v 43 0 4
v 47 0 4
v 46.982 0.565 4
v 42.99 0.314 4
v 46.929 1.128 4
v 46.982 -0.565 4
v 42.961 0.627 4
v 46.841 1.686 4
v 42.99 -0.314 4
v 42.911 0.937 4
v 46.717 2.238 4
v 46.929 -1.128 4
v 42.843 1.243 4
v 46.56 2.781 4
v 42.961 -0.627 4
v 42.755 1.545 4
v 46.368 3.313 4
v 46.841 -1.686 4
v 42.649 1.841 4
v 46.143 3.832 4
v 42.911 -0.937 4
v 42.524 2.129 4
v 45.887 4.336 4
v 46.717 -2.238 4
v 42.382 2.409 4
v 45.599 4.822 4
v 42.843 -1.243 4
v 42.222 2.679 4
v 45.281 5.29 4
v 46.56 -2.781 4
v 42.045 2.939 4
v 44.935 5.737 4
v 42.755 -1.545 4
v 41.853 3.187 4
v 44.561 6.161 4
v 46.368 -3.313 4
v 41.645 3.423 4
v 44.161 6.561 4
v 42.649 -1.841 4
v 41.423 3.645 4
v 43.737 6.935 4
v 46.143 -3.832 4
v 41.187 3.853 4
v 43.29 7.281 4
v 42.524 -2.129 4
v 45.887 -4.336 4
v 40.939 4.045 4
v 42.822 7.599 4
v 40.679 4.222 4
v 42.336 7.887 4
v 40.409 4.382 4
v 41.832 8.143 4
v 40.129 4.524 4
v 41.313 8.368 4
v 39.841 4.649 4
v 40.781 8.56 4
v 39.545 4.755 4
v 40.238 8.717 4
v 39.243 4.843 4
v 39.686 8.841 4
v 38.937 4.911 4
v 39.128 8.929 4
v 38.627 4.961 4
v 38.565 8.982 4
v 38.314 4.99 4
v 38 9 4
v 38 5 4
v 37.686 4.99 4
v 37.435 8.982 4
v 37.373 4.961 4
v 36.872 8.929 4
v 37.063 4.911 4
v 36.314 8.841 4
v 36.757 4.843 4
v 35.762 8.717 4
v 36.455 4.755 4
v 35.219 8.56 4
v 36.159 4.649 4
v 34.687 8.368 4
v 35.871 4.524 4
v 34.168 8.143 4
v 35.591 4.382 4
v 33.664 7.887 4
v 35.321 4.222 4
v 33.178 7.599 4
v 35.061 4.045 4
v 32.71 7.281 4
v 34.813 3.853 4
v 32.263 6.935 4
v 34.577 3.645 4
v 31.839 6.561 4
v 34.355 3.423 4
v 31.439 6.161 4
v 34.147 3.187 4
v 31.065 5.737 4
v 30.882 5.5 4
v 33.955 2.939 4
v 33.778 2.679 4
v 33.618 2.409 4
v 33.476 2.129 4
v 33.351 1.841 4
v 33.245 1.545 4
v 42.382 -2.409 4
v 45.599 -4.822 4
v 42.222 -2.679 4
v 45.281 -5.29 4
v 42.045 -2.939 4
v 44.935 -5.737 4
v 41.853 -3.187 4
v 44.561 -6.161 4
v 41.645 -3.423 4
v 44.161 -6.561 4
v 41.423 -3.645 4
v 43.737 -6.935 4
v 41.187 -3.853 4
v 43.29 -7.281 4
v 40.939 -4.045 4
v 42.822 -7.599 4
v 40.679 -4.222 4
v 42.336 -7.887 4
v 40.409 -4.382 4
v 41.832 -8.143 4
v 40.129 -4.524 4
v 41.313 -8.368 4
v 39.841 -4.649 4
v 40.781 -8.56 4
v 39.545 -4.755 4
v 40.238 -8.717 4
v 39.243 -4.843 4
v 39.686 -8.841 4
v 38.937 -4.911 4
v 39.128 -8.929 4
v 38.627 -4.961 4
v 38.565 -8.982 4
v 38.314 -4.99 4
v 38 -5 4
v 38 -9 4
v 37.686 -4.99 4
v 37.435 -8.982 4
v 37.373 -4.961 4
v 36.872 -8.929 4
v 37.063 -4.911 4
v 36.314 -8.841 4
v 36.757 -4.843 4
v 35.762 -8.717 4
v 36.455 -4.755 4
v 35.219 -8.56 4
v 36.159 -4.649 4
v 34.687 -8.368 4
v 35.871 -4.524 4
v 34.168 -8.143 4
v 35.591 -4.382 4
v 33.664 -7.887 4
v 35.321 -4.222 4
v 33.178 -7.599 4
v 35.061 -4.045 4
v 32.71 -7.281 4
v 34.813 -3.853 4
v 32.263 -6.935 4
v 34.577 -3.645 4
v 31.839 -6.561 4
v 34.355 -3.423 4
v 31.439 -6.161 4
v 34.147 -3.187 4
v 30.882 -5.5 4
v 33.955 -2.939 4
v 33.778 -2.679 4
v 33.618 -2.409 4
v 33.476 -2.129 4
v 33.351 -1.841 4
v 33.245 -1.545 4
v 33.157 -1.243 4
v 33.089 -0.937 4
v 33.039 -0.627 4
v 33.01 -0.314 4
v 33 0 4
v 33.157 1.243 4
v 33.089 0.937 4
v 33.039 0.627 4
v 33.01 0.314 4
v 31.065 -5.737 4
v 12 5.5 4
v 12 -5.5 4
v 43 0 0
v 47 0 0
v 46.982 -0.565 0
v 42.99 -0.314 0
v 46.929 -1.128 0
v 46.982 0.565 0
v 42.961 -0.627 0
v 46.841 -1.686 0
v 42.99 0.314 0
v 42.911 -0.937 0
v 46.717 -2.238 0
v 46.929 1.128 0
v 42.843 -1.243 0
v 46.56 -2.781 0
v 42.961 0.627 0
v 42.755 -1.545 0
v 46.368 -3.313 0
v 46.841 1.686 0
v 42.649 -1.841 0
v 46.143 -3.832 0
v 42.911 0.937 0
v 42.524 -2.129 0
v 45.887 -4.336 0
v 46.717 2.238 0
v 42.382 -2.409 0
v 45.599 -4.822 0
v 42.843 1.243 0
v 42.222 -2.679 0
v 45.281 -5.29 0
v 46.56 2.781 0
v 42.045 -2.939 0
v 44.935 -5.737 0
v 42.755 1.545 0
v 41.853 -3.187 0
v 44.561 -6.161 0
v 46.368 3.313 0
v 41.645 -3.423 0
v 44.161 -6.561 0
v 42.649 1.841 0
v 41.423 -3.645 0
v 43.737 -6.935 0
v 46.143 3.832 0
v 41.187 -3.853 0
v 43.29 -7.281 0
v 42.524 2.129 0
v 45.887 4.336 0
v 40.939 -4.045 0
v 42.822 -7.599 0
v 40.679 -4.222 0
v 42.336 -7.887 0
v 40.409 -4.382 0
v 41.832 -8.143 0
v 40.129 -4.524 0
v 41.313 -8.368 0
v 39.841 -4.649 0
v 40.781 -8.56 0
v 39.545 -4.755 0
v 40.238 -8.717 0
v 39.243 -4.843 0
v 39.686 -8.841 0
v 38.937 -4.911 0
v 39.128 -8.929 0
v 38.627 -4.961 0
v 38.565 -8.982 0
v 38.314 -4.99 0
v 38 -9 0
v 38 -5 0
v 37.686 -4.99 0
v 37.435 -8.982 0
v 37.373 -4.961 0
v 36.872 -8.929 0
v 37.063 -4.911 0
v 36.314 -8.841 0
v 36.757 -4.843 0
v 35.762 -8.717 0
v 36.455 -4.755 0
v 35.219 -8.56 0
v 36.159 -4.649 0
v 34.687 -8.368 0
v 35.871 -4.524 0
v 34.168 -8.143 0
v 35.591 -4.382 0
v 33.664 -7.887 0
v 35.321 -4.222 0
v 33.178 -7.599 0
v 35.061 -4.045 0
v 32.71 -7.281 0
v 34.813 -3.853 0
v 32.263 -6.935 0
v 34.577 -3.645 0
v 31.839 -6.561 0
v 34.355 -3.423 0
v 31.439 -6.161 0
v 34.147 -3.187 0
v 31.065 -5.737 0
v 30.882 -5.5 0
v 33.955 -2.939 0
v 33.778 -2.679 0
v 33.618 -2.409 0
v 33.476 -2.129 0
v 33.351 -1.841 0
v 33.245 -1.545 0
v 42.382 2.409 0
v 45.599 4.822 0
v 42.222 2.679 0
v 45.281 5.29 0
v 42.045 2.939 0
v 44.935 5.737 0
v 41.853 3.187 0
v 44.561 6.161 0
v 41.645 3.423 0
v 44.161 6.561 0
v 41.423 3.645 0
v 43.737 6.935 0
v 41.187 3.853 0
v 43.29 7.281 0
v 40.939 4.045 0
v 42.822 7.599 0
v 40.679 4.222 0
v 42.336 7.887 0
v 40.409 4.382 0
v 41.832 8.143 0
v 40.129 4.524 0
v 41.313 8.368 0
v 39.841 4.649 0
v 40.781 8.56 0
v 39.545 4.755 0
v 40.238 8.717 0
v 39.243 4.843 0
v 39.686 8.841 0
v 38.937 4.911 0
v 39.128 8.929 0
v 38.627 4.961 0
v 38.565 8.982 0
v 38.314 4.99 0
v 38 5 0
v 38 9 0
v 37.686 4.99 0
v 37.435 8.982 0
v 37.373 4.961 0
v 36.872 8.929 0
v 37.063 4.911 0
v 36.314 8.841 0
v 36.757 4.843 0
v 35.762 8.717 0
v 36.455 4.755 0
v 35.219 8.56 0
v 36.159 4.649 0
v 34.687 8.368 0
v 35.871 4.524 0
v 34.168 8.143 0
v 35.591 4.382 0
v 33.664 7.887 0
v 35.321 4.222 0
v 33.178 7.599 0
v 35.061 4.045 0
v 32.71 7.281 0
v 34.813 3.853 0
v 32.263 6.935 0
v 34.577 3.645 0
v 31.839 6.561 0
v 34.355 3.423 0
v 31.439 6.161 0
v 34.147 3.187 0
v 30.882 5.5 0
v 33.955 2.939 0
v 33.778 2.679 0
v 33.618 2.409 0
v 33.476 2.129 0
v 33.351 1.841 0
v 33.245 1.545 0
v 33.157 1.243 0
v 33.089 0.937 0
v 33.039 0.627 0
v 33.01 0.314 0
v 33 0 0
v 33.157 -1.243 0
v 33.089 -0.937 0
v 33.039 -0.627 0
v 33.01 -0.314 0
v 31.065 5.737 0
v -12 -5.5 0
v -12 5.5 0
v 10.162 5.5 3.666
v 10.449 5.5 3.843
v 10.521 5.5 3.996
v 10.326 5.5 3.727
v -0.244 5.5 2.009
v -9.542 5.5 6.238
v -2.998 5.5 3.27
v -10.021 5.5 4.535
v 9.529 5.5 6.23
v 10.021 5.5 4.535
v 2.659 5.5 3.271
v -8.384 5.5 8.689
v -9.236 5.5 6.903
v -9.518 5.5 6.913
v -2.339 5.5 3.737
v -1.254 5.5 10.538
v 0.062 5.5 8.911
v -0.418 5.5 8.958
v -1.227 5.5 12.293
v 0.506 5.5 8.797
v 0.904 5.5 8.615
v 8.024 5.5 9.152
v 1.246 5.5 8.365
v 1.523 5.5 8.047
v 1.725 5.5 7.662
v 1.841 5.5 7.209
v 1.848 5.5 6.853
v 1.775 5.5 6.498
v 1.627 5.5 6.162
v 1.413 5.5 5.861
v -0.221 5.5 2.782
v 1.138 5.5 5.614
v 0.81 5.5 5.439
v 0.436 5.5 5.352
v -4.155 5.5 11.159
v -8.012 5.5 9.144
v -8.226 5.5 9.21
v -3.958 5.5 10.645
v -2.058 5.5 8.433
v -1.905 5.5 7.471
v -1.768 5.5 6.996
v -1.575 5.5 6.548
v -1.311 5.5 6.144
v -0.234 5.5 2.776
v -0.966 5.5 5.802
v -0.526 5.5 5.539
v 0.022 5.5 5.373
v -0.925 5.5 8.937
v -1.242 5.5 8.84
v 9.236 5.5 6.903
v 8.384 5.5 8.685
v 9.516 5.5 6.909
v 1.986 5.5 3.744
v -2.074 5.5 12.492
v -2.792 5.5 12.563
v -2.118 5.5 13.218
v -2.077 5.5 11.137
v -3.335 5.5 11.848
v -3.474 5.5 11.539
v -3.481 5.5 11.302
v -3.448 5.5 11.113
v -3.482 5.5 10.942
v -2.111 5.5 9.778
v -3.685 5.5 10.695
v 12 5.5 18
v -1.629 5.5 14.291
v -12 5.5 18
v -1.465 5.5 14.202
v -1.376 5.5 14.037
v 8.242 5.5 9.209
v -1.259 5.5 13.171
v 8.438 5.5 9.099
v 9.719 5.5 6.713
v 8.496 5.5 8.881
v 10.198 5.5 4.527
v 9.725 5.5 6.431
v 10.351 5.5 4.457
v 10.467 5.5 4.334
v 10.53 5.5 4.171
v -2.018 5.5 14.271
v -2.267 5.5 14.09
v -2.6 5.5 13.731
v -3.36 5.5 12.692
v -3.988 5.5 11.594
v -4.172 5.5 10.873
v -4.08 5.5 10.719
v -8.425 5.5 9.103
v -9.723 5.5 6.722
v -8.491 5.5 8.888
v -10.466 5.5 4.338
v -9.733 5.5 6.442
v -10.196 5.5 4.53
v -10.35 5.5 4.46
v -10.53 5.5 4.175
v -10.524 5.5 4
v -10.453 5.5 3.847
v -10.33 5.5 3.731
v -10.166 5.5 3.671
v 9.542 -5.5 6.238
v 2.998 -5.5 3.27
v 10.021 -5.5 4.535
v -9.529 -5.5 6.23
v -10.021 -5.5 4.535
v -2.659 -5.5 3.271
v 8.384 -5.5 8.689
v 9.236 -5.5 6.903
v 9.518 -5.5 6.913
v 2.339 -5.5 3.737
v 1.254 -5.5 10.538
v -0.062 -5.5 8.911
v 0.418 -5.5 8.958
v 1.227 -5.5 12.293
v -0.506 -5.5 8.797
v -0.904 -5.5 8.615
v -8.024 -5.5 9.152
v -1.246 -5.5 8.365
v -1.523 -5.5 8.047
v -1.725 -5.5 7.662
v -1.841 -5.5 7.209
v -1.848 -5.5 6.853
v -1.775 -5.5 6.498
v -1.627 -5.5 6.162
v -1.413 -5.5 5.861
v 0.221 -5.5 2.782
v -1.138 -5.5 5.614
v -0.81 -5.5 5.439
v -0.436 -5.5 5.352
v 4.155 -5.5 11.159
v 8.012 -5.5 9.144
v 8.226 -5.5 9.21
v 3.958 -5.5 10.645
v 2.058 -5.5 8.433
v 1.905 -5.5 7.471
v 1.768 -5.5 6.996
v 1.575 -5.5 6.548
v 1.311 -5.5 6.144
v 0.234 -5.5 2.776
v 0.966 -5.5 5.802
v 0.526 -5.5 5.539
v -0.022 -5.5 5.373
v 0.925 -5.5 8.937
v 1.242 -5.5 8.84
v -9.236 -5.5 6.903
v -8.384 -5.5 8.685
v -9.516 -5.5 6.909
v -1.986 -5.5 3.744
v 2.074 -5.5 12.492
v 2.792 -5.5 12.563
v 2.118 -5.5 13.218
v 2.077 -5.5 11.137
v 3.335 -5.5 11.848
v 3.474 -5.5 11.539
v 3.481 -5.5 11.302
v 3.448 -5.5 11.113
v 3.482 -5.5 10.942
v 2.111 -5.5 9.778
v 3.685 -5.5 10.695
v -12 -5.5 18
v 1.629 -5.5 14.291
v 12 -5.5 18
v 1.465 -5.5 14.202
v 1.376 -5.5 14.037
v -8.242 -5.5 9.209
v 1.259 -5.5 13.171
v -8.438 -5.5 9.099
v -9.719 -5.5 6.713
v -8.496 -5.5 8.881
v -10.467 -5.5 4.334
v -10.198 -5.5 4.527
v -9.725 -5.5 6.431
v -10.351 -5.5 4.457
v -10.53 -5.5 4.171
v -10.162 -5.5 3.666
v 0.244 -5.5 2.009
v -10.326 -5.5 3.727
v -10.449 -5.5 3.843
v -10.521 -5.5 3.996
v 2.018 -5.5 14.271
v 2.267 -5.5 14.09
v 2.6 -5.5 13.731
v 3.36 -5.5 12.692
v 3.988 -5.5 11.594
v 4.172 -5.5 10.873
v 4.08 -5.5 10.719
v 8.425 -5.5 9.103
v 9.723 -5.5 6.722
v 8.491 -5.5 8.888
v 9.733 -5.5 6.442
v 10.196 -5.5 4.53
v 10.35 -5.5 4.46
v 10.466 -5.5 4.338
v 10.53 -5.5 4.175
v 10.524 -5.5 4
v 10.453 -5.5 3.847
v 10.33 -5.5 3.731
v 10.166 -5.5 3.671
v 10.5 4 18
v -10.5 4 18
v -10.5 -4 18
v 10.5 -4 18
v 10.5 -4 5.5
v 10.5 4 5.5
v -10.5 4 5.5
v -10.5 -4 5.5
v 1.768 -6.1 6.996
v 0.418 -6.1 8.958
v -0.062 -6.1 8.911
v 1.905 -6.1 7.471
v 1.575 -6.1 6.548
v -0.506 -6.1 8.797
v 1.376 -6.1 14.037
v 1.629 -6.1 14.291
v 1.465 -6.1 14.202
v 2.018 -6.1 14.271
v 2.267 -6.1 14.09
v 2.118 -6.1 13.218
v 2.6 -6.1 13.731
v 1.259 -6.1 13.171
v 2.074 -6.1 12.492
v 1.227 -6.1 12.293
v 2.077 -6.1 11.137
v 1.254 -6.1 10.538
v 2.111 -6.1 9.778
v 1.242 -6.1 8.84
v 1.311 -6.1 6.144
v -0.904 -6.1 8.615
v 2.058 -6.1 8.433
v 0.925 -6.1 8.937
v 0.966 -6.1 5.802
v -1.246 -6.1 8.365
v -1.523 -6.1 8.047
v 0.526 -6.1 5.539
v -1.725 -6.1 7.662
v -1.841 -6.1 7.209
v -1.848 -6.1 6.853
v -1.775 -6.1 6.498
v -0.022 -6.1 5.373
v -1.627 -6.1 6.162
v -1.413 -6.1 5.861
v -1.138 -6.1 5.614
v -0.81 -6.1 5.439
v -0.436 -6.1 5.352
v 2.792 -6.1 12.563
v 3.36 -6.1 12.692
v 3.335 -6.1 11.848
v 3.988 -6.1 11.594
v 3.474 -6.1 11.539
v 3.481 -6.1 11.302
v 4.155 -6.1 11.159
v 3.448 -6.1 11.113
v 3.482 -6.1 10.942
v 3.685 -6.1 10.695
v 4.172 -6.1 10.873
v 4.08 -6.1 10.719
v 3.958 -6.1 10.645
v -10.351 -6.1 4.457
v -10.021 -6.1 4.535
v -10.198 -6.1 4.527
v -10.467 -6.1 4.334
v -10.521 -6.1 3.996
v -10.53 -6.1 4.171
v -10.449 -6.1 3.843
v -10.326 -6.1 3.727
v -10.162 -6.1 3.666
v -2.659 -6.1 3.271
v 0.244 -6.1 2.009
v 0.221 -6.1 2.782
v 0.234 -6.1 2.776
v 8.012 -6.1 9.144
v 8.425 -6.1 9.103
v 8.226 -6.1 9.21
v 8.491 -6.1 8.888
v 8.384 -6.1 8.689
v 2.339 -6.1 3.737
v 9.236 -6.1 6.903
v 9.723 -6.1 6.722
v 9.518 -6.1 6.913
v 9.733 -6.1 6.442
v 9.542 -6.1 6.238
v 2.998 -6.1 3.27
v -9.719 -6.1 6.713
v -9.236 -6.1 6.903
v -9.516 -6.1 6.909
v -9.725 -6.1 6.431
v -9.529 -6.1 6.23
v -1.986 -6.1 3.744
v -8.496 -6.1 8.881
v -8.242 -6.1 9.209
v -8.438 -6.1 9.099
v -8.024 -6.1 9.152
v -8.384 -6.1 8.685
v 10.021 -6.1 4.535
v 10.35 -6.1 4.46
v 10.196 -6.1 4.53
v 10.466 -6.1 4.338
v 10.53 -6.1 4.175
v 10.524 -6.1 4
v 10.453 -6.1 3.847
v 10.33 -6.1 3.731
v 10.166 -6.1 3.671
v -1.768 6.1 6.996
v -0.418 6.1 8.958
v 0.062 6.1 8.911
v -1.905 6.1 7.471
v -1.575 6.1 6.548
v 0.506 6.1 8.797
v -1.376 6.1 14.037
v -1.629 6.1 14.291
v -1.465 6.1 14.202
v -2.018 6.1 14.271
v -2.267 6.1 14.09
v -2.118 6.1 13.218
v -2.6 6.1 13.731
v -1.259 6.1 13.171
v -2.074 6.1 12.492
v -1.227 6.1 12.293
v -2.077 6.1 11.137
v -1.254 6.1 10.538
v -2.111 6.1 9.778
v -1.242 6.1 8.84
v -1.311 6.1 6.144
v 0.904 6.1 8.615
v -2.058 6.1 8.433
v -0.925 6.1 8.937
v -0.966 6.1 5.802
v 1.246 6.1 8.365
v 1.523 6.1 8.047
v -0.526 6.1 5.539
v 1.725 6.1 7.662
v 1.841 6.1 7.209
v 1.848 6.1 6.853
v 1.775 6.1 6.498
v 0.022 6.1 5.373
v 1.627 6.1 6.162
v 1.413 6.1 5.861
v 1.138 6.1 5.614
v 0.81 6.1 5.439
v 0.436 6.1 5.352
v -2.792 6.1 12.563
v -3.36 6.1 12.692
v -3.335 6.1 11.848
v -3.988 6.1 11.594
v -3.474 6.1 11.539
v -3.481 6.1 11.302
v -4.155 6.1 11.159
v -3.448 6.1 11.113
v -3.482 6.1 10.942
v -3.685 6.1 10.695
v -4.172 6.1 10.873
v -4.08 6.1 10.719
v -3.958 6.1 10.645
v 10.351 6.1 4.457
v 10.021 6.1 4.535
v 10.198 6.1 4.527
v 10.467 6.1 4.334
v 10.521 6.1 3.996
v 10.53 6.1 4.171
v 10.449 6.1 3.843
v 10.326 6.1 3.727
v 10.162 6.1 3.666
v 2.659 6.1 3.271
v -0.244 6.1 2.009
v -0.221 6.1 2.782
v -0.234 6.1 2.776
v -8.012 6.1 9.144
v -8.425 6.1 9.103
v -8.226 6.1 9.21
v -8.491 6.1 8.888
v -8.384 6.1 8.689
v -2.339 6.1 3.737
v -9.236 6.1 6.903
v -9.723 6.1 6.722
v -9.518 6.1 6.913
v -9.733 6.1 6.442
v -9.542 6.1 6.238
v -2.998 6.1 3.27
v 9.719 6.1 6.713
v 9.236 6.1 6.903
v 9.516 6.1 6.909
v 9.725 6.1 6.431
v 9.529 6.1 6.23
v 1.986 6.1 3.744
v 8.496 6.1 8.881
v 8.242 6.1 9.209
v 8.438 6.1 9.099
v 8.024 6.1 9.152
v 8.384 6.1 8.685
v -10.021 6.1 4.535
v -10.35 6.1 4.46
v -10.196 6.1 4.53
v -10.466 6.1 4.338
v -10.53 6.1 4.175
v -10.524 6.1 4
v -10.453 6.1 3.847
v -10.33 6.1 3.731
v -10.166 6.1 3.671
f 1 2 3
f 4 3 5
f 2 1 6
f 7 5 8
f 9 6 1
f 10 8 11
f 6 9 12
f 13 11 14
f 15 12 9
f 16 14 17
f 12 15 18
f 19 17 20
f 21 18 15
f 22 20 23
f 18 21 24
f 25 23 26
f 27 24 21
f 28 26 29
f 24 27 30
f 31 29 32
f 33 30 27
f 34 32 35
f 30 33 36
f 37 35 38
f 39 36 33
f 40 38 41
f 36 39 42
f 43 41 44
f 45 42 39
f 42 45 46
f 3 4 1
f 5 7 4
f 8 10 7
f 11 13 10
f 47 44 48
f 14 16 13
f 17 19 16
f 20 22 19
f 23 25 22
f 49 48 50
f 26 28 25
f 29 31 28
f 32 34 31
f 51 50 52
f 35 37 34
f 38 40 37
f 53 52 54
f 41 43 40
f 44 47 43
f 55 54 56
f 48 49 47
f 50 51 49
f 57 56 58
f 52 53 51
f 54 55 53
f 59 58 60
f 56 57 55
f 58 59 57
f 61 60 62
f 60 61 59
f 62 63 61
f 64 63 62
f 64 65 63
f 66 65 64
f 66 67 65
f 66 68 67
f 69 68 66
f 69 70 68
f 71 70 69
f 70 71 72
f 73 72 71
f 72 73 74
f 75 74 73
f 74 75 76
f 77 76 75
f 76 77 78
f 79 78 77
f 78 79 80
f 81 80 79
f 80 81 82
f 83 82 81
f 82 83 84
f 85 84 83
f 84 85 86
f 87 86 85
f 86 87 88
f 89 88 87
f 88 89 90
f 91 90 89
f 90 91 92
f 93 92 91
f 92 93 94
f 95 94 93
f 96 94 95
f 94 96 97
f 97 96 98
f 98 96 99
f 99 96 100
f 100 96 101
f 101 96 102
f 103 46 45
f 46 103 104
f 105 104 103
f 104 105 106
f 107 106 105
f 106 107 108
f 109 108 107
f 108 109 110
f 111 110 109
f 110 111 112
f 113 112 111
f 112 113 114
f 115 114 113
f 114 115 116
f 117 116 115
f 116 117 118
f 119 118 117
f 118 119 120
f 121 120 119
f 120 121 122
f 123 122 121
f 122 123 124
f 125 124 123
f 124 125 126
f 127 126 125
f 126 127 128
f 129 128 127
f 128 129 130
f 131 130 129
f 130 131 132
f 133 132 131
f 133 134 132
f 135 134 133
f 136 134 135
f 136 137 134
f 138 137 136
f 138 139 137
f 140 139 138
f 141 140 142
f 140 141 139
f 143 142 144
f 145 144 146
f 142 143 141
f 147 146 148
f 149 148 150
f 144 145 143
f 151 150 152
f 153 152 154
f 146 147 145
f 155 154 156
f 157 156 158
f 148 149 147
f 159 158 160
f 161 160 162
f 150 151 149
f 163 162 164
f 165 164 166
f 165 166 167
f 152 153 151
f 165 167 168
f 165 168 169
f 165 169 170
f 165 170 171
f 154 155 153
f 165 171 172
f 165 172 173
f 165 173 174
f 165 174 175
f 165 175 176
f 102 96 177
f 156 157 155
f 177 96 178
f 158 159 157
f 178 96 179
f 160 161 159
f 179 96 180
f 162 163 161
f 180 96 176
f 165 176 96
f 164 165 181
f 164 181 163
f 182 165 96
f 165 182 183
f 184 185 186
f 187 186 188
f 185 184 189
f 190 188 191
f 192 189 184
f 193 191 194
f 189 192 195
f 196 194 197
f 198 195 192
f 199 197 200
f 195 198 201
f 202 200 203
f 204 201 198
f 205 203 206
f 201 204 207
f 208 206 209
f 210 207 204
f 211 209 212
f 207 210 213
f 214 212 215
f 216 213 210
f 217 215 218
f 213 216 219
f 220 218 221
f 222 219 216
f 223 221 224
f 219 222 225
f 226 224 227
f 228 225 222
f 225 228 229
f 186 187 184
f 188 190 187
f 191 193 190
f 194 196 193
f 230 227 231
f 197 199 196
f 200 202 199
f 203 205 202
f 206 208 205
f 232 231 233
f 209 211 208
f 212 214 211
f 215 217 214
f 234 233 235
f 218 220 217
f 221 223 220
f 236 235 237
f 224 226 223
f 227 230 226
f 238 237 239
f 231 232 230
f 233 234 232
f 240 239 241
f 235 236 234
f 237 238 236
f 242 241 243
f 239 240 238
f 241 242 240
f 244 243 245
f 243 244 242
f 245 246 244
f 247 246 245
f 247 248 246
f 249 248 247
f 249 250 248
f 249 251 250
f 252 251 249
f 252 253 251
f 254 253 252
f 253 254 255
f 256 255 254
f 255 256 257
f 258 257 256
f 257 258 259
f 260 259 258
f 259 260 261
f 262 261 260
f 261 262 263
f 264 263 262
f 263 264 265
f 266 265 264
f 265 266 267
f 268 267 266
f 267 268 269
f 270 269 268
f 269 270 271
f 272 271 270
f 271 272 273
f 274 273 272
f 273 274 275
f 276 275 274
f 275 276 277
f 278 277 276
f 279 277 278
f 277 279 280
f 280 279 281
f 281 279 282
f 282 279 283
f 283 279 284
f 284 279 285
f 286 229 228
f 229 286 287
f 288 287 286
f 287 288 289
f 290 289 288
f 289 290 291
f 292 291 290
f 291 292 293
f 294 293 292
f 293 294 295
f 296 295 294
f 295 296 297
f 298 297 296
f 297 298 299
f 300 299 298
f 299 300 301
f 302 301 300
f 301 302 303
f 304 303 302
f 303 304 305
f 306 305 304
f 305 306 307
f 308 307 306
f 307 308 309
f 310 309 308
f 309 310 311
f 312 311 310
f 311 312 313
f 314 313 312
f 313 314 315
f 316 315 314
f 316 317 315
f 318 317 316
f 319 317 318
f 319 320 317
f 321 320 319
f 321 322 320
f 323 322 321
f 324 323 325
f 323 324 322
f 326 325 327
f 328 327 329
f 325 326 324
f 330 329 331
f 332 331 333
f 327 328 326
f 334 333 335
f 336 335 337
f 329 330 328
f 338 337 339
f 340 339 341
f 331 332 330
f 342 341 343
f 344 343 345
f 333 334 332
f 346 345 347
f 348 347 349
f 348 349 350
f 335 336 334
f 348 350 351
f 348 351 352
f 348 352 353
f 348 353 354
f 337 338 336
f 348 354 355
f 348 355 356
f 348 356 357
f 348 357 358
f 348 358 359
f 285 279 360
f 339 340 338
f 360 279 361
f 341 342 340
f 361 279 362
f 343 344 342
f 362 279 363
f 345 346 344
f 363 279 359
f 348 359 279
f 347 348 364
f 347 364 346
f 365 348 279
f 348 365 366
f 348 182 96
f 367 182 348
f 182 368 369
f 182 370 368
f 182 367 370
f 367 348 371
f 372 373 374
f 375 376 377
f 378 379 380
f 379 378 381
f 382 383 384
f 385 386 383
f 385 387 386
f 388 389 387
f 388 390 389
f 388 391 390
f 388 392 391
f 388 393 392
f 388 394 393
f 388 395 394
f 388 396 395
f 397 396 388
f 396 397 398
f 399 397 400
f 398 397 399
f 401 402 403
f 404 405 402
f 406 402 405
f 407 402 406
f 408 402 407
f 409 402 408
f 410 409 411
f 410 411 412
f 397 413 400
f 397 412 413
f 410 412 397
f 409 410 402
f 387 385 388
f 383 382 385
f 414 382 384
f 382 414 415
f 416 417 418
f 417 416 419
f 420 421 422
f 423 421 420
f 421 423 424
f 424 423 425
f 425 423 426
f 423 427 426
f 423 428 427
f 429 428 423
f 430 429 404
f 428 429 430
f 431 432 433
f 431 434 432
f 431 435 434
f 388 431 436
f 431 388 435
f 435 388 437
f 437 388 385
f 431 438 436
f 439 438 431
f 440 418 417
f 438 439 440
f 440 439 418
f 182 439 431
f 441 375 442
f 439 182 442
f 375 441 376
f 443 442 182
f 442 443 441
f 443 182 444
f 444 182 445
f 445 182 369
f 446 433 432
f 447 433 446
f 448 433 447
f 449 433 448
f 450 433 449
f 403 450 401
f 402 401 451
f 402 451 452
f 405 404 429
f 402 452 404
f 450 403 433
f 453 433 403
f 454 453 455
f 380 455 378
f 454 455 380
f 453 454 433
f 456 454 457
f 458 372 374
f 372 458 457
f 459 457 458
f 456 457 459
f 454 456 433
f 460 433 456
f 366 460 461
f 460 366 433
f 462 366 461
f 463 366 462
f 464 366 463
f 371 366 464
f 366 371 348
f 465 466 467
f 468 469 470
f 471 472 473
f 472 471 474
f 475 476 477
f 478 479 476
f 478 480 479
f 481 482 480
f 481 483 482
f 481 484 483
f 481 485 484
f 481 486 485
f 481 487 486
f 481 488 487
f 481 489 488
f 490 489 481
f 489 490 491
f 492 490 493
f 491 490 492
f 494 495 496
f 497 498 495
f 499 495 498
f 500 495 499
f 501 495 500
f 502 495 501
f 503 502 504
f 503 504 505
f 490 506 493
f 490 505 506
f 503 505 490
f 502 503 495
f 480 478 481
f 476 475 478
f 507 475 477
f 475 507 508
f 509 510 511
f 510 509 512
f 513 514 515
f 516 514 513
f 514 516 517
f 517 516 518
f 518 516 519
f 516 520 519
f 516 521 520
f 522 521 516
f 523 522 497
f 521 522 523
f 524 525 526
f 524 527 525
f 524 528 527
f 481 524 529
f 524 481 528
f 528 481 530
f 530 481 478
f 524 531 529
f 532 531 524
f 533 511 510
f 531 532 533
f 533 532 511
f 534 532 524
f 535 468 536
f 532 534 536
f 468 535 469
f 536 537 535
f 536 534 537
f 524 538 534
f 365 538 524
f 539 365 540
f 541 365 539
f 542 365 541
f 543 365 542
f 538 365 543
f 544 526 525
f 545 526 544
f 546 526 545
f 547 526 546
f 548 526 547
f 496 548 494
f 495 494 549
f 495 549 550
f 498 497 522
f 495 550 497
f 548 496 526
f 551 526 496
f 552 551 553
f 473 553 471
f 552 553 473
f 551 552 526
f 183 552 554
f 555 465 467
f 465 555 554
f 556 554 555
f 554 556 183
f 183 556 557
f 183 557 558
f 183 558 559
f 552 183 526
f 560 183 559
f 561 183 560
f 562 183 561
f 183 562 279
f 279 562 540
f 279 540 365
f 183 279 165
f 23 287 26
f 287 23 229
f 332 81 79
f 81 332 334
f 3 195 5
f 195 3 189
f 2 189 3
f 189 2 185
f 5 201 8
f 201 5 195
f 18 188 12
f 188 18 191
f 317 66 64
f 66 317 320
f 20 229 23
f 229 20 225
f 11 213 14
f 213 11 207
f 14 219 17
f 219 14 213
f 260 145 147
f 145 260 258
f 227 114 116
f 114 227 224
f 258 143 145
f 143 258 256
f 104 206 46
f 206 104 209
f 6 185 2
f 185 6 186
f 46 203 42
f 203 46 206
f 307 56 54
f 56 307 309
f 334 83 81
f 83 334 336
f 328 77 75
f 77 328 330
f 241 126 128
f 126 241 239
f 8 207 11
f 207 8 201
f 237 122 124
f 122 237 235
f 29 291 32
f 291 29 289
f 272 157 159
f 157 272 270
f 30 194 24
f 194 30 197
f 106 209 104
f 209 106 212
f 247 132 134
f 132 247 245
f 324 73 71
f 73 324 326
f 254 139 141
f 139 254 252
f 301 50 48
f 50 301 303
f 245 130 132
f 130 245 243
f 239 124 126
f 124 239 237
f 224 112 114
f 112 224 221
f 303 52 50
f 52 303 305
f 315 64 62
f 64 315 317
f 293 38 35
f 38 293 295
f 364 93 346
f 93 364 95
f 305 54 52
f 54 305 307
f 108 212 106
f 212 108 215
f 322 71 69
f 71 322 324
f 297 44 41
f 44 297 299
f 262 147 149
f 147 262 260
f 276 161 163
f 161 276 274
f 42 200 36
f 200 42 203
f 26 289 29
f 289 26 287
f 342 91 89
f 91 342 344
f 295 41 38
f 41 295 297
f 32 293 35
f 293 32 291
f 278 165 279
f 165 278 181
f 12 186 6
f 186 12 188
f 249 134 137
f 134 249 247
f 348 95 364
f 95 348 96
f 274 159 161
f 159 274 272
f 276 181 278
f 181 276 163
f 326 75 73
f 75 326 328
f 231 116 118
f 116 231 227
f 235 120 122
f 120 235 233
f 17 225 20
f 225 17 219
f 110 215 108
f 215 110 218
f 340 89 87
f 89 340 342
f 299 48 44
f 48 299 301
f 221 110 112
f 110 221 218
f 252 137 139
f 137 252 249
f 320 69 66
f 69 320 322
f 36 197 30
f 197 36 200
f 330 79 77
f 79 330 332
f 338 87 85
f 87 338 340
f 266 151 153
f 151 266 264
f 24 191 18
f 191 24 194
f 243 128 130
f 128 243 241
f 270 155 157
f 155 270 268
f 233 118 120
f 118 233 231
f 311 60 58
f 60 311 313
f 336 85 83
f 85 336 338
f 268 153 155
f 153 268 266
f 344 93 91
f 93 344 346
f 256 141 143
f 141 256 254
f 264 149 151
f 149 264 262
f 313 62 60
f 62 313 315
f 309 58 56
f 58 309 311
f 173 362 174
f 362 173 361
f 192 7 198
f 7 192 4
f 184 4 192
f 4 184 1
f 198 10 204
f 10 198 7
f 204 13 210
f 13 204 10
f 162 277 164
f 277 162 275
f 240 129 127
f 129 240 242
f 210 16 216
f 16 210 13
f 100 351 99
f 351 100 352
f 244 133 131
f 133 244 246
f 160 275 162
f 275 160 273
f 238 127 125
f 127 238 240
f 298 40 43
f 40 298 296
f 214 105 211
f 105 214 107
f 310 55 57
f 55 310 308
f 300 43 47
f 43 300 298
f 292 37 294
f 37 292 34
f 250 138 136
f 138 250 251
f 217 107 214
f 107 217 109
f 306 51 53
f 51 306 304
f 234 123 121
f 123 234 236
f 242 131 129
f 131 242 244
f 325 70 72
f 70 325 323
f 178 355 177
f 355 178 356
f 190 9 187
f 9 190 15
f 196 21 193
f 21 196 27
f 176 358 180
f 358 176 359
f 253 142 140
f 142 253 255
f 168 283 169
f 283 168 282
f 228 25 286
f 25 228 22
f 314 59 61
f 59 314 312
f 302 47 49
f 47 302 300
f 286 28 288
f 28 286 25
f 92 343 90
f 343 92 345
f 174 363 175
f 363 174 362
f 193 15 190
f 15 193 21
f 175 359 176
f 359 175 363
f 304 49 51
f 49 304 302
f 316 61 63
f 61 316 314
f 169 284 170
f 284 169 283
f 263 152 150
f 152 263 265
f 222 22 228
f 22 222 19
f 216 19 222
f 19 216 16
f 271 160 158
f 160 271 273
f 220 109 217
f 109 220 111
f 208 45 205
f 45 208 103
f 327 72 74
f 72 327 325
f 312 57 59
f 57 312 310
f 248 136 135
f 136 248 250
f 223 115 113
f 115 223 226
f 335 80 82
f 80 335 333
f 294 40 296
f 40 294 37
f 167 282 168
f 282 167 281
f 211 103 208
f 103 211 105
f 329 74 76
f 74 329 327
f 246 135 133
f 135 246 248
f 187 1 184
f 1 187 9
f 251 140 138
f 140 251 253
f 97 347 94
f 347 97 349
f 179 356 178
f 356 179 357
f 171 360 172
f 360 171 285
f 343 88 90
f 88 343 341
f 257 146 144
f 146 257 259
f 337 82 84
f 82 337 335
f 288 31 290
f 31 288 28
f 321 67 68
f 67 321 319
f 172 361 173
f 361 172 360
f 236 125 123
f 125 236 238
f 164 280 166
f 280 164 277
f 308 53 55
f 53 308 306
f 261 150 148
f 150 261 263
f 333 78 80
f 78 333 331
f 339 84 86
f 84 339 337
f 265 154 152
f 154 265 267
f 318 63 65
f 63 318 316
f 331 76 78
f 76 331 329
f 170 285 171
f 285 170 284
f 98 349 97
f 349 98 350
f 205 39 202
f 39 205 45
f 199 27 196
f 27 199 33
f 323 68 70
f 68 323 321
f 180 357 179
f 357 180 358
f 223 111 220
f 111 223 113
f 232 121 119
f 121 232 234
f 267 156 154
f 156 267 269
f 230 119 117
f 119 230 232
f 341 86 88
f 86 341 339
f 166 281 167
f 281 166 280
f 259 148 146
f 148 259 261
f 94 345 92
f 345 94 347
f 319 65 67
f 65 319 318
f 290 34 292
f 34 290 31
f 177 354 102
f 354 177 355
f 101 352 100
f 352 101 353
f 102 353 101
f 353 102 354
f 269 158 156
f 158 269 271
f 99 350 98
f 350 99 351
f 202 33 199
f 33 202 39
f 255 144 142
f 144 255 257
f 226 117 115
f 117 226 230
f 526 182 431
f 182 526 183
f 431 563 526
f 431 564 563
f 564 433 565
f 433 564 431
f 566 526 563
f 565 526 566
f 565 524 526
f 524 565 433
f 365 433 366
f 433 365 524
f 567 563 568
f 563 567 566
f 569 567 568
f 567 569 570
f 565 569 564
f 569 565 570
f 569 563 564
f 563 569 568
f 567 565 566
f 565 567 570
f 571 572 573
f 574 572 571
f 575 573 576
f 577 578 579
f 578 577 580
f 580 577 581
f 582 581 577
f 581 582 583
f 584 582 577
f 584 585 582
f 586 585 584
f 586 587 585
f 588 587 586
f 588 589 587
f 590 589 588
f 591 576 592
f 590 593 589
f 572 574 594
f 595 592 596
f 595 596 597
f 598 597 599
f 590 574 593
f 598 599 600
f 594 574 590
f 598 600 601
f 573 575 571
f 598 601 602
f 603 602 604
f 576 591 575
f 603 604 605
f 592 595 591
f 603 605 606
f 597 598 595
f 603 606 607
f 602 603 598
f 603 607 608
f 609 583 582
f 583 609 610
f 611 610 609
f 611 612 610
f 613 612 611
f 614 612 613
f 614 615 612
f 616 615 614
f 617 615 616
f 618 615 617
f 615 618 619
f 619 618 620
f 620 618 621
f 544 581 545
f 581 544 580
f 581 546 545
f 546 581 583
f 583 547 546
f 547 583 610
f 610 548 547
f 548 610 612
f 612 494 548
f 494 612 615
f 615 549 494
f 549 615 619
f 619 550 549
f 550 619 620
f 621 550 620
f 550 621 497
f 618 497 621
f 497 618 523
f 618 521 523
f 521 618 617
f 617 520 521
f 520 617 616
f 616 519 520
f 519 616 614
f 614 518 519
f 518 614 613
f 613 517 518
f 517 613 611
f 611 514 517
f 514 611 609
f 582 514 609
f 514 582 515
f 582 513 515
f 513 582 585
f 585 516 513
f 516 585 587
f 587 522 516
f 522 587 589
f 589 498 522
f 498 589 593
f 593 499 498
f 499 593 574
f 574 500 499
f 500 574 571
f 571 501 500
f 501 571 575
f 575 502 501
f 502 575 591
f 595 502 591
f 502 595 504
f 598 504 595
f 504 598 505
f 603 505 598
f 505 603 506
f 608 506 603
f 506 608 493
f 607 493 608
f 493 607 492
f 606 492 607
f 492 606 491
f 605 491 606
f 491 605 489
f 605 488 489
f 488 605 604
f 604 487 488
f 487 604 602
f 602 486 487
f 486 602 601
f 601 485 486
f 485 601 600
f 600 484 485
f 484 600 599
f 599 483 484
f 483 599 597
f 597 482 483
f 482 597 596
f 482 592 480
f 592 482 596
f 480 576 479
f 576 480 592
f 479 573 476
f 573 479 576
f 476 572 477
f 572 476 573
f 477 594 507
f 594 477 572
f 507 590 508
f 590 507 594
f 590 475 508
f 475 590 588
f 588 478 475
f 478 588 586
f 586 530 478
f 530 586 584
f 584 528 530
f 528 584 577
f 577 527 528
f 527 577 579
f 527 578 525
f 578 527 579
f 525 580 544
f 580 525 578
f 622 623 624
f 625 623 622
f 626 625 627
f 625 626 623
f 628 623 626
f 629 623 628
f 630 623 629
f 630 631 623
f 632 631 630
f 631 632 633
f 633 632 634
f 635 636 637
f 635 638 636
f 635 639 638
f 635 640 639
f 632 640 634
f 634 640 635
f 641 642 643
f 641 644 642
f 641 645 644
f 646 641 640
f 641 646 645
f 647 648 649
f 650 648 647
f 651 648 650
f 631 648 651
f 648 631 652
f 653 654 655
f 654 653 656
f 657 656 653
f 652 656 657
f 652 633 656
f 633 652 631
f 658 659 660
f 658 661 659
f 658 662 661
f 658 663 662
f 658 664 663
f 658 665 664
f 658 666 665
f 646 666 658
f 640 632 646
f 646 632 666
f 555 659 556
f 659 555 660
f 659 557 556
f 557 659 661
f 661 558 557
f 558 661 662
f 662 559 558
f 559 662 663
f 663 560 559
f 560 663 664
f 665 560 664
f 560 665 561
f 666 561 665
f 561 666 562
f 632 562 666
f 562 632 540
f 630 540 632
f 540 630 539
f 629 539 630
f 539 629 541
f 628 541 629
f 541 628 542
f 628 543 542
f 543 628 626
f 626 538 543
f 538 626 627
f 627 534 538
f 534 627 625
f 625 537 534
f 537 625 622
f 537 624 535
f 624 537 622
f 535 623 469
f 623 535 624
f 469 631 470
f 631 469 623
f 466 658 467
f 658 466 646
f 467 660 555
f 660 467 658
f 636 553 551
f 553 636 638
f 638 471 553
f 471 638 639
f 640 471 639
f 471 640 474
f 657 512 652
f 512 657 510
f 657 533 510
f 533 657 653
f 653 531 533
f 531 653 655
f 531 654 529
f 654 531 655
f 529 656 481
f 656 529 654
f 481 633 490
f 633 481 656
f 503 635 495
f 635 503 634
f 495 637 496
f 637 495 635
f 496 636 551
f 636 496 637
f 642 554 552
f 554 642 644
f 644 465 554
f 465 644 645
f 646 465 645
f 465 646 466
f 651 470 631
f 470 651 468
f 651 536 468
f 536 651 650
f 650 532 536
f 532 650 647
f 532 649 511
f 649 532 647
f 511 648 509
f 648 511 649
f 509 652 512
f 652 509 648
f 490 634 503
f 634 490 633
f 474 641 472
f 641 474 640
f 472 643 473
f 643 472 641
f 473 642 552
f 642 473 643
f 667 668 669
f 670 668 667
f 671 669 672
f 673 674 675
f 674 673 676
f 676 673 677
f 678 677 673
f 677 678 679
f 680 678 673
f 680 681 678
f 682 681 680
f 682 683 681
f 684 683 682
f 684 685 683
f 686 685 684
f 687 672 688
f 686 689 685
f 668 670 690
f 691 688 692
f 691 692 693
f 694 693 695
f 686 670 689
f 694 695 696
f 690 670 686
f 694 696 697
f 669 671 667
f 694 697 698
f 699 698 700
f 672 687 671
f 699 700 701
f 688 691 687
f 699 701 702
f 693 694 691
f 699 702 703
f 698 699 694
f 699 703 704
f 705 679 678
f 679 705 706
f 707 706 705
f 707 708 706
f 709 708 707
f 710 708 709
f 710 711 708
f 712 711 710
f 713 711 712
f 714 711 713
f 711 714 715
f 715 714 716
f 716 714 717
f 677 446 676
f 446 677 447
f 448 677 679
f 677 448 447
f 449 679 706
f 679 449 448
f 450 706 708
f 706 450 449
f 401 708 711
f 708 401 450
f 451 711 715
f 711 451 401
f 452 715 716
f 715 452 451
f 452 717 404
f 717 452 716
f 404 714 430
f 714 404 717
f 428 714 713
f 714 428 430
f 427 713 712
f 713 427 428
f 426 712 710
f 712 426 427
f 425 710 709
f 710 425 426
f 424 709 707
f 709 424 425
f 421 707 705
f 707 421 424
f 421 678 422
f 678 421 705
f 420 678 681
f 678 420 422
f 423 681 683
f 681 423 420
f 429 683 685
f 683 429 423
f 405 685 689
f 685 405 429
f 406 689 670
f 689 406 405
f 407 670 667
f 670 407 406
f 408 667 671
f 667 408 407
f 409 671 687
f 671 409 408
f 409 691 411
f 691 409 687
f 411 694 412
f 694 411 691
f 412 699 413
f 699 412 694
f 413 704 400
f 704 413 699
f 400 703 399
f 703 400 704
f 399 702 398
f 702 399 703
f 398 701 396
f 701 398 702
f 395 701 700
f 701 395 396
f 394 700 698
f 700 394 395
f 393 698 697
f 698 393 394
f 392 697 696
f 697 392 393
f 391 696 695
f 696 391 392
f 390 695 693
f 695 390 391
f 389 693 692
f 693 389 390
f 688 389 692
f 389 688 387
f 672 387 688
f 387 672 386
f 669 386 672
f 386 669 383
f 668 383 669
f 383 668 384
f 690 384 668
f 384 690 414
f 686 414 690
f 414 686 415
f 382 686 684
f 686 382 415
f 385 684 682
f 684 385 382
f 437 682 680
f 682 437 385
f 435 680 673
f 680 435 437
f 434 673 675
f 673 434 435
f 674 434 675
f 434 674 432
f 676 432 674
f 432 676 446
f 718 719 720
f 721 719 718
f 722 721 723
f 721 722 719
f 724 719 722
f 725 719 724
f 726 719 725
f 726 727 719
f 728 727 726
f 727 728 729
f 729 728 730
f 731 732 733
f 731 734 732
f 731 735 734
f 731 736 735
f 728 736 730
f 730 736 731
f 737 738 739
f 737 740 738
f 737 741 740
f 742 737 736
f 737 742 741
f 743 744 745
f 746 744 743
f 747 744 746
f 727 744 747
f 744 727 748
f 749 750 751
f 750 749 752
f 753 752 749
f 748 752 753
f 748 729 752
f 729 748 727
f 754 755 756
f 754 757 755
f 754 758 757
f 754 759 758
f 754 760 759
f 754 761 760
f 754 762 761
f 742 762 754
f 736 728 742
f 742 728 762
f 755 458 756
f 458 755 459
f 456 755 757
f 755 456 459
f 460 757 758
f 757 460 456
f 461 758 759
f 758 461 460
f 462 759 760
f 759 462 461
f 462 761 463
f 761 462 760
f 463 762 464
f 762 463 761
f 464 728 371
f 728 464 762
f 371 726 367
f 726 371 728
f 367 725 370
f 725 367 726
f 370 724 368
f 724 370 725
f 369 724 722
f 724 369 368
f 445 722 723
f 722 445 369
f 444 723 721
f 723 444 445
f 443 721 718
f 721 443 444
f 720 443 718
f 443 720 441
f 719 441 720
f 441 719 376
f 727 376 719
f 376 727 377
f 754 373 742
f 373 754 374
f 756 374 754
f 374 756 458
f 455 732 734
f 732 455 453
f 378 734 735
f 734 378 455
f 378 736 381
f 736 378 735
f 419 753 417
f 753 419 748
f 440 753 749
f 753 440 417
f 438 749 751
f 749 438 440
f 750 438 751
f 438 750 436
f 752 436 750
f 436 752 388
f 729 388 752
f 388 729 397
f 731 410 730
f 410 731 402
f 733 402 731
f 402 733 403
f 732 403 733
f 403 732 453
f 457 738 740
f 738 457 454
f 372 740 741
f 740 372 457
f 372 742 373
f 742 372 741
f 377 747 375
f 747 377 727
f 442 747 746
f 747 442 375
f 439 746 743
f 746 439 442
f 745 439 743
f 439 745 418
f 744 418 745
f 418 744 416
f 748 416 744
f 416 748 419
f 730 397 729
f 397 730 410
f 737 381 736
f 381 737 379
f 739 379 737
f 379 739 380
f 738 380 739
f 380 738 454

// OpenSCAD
/*
 *    Guitar String Winder -- OpenSCAD source
 *    Copyright 2011, Stephen M. Cameron 
 *
 *    This program is free software; you can redistribute it and/or modify
 *    it under the terms of the GNU General Public License as published by
 *    the Free Software Foundation; version 2 of the License.
 *
 *    This program is distributed in the hope that it will be useful,
 *    but WITHOUT ANY WARRANTY; without even the implied warranty of
 *    MERCHANTABILITY OR FITNESS FOR A PARTICULAR PURPOSE, GOOD TITLE or
 *    NON INFRINGEMENT.  See the GNU General Public License for more details.
 *
 *    You should have received a copy of the GNU General Public License
 *    along with this program; if not, write to the Free Software
 *    Foundation, Inc., 675 Mass Ave, Cambridge, MA 02139, USA.
 *
 */

/* For best printing results, export these to .stl files one at a time. */
print_pin = 0;
print_handle = 0;
print_crank = 1;

winder_width=21;
winder_height=8;
winder_depth=15;

handle_radius=5;
handle_radius2=9;
handle_length=75;
crank_length=(25);
crank_height=4;
crank_width=(winder_height + 3);

module winder_head()
{
	difference() {
		cube(size = [winder_width + 3, winder_height + 3, 
			winder_depth + 3], center=true);
		translate(v = [0, 0, 4])  {
			cube(size = [winder_width, winder_height, 
				winder_depth], center=true);
		}
	}
}

module winder_crank(x, y, z)
{
	translate(v = [x, y, z]) {
		difference() {
			union() {

				cube(size = [ crank_length + 20,
					crank_width, crank_height],
					center = true);
				translate(v = [20 + crank_width / 2, 0, -crank_height / 2])
					cylinder(h = crank_height, r1 = handle_radius2,
						r2 = handle_radius2, center = false);
			}
			translate(v = [20 + crank_width / 2, 0, -10])
				cylinder(h = 35, r1 = handle_radius,
					r2 = handle_radius, center = false);
		}
	}
}

module pin(x, y, z)
{
	translate( v = [x, y, z]) {
		union() {
			cylinder(h = handle_length / 2,
				r1 = handle_radius - 0.5 ,
				r2 = handle_radius - 0.5, center = false);
			cylinder(h = handle_length / 20,
				r1 = handle_radius2, 
				r2 = handle_radius2, center = false);
		}
	}
}

module handle(x, y, z)
{
	translate( v = [x, y, z]) {
		difference() {
			cylinder(h = handle_length, r1 = handle_radius2,
				r2 = handle_radius2, center = false);
			translate( v = [ 0, 0, 5 ])
				cylinder(h = handle_length - 5,
					r1 = handle_radius,
					r2 = handle_radius, center = false);
		}
	}
}


module string_winder(x, y, z)
{
	translate( v = [x, y, z]) {
		union() {
			if (print_crank != 0) {
				winder_crank( crank_length / 2, 0, - winder_depth / 2 + 0.5);
				winder_head();
			}
		}
		if (print_handle != 0)
			handle(crank_length + 25, 0, -9);
		if (print_pin != 0)
			pin(-25, 0, -9);
	}
}

string_winder(0, 0, 9);



$fn = 100;

pick_height=1.0;
logo_height=pick_height;
use_text = true;
hole_diameter = 4.0;


fudge = 0.1;
line_fn = 4;
min_line_width = 1.0;
function min_line_mm(w) = max(min_line_width, w) * 90/25.4;
s = 0.7;
caption = pick_height == 1 ? "1.0" : pick_height == 2 ? "2.0" : str(pick_height);


path12_0_center = [5.226885,-8.196161];

path12_0_points = [[4.160146,-4.213856],[1.882396,-4.310025],[-0.277709,-4.100636],[-2.275766,-3.585921],[-4.067372,-2.766106],[-5.608125,-1.641422],[-6.853620,-0.212097],[-7.759456,1.521641],[-8.281229,3.559561],[-8.315714,5.159441],[-7.985819,6.756574],[-7.322674,8.271311],[-6.357406,9.623999],[-5.121142,10.734988],[-3.645010,11.524629],[-1.960139,11.913269],[-0.097656,11.821259],[2.366327,11.072588],[4.346913,9.889501],[5.900864,8.350275],[7.084943,6.533186],[7.955912,4.516514],[8.570535,2.378534],[9.257789,-1.948237],[9.497351,-7.998942],[9.343238,-14.113733],[9.331946,-20.210214],[9.528174,-23.479859],[12.563444,-20.529733],[15.005455,-17.312273],[15.632055,-15.925443],[15.664022,-14.858360],[15.516280,-14.005434],[15.668600,-13.235135],[16.579547,-12.126434],[17.809097,-11.900299],[18.359671,-12.233207],[18.769483,-12.924772],[18.695288,-14.213144],[17.945206,-16.171223],[15.119590,-21.113227],[11.697053,-25.784236],[10.200818,-27.403571],[9.082008,-28.217701],[7.329083,-28.305592],[6.593611,-27.904592],[6.191390,-27.163016],[5.666489,-23.266847],[5.522447,-19.313915],[5.644517,-11.420869],[5.588365,-3.778313]];

module poly_path12(h, w, s, res=line_fn)
{
    sx = 25.4/90 * 1.05;
  scale([sx, -sx, 1]) union()
  {
    translate (path12_0_center) linear_extrude(height=h, convexity=10, scale=0.01*s)
      translate (-path12_0_center) polygon(path12_0_points);

  }
}

path34_0_center = [1.210934,3.149406];
path34_0_points = [[7.304669,3.149406],[6.824934,5.518785],[5.517564,7.456036],[3.580313,8.763405],[1.210934,9.243140],[-1.158444,8.763405],[-3.095695,7.456036],[-4.403065,5.518785],[-4.882800,3.149406],[-4.403065,0.780027],[-3.095695,-1.157224],[-1.158444,-2.464593],[1.210934,-2.944328],[3.580313,-2.464593],[5.517564,-1.157224],[6.824934,0.780027],[7.304669,3.149406],[7.304669,3.149406]];
module poly_path34(h, w, s, res=line_fn)
{
    sx1 = 25.4/90 * 1.1;
  scale([sx1, -sx1, 1]) union()
  {
    translate (path34_0_center) linear_extrude(height=h, convexity=10, scale=0.01*s)
      translate (-path34_0_center) polygon(path34_0_points);
  }
}

path18_0_center = [-0.000000,22.338810];
path18_0_points = [[1.152341,28.305592],[-48.007690,20.473580],[-48.781919,20.186411],[-49.367549,19.641063],[-49.707820,18.916272],[-49.745966,18.090774],[-49.450252,17.319597],[-48.903683,16.740680],[-48.177672,16.407124],[-47.343629,16.372028],[1.132810,24.692320],[47.343629,16.372028],[48.169432,16.395832],[48.896359,16.723590],[49.447505,17.300371],[49.745966,18.071243],[49.719111,18.896741],[49.384639,19.621532],[48.801145,20.166880],[48.027221,20.454049],[1.152341,28.305592],[1.152341,28.305592]];
module poly_path18(h, w, s, res=line_fn)
{
  scale([25.4/90, -25.4/90, 1]) union()
  {
    translate (path18_0_center) linear_extrude(height=h, convexity=10, scale=0.01*s)
      translate (-path18_0_center) polygon(path18_0_points);
  }
}

path26_0_center = [-0.010986,11.264620];
path26_0_points = [[1.152341,28.246998],[-39.609274,-3.237296],[-40.139057,-4.162587],[-39.863179,-5.190416],[-38.937889,-5.712876],[-37.910059,-5.444322],[1.093747,24.692320],[37.851466,-5.405260],[38.864647,-5.717759],[39.804586,-5.209948],[40.117085,-4.196767],[39.609274,-3.256828],[1.152341,28.246998],[1.152341,28.246998]];
module poly_path26(h, w, s, res=line_fn)
{
  scale([25.4/90, -25.4/90, 1]) union()
  {
    translate (path26_0_center) linear_extrude(height=h, convexity=10, scale=0.01*s)
      translate (-path26_0_center) polygon(path26_0_points);
  }
}

path22_0_center = [0.019531,16.690631];
path22_0_points = [[1.152341,28.246998],[-45.019416,8.364236],[-45.944707,7.412090],[-45.917851,6.079086],[-44.958381,5.153795],[-43.632701,5.180651],[1.132810,24.692320],[43.632701,5.180651],[44.968147,5.134264],[45.937382,6.040024],[45.983769,7.358380],[45.078010,8.325174],[1.152341,28.246998],[1.152341,28.246998]];
module poly_path22(h, w, s, res=line_fn)
{
  scale([25.4/90, -25.4/90, 1]) union()
  {
    translate (path22_0_center) linear_extrude(height=h, convexity=10, scale=0.01*s)
      translate (-path22_0_center) polygon(path22_0_points);
  }
}

module zpevnik(h)
{
  difference()
  {
    union()
    {
      translate ([0,0,0]) poly_path12(h, min_line_mm(1.0), 100.0);
      //translate ([0,0,0]) poly_path34(h, min_line_mm(1.0), 100.0);
      translate ([0,0,0]) poly_path18(h, min_line_mm(1.0), 100.0);
      translate ([0,0,0]) poly_path26(h, min_line_mm(1.0), 100.0);
      translate ([0,0,0]) poly_path22(h, min_line_mm(1.0), 100.0);
    }
  }
}

if (print_crank != 0) {
    xyz = 0.6;
    s = 0.75;
    translate([0, - winder_height / 2 - xyz, 8])
    color([1, 0, 0])
    scale([s, s, s])
    rotate([90, 0, 0])
    zpevnik(2);

    translate([0, winder_height / 2 + xyz, 8])
    color([1, 1, 0])
    scale([s, s, s])
    rotate([90, 0, 180])
    zpevnik(2);
}
